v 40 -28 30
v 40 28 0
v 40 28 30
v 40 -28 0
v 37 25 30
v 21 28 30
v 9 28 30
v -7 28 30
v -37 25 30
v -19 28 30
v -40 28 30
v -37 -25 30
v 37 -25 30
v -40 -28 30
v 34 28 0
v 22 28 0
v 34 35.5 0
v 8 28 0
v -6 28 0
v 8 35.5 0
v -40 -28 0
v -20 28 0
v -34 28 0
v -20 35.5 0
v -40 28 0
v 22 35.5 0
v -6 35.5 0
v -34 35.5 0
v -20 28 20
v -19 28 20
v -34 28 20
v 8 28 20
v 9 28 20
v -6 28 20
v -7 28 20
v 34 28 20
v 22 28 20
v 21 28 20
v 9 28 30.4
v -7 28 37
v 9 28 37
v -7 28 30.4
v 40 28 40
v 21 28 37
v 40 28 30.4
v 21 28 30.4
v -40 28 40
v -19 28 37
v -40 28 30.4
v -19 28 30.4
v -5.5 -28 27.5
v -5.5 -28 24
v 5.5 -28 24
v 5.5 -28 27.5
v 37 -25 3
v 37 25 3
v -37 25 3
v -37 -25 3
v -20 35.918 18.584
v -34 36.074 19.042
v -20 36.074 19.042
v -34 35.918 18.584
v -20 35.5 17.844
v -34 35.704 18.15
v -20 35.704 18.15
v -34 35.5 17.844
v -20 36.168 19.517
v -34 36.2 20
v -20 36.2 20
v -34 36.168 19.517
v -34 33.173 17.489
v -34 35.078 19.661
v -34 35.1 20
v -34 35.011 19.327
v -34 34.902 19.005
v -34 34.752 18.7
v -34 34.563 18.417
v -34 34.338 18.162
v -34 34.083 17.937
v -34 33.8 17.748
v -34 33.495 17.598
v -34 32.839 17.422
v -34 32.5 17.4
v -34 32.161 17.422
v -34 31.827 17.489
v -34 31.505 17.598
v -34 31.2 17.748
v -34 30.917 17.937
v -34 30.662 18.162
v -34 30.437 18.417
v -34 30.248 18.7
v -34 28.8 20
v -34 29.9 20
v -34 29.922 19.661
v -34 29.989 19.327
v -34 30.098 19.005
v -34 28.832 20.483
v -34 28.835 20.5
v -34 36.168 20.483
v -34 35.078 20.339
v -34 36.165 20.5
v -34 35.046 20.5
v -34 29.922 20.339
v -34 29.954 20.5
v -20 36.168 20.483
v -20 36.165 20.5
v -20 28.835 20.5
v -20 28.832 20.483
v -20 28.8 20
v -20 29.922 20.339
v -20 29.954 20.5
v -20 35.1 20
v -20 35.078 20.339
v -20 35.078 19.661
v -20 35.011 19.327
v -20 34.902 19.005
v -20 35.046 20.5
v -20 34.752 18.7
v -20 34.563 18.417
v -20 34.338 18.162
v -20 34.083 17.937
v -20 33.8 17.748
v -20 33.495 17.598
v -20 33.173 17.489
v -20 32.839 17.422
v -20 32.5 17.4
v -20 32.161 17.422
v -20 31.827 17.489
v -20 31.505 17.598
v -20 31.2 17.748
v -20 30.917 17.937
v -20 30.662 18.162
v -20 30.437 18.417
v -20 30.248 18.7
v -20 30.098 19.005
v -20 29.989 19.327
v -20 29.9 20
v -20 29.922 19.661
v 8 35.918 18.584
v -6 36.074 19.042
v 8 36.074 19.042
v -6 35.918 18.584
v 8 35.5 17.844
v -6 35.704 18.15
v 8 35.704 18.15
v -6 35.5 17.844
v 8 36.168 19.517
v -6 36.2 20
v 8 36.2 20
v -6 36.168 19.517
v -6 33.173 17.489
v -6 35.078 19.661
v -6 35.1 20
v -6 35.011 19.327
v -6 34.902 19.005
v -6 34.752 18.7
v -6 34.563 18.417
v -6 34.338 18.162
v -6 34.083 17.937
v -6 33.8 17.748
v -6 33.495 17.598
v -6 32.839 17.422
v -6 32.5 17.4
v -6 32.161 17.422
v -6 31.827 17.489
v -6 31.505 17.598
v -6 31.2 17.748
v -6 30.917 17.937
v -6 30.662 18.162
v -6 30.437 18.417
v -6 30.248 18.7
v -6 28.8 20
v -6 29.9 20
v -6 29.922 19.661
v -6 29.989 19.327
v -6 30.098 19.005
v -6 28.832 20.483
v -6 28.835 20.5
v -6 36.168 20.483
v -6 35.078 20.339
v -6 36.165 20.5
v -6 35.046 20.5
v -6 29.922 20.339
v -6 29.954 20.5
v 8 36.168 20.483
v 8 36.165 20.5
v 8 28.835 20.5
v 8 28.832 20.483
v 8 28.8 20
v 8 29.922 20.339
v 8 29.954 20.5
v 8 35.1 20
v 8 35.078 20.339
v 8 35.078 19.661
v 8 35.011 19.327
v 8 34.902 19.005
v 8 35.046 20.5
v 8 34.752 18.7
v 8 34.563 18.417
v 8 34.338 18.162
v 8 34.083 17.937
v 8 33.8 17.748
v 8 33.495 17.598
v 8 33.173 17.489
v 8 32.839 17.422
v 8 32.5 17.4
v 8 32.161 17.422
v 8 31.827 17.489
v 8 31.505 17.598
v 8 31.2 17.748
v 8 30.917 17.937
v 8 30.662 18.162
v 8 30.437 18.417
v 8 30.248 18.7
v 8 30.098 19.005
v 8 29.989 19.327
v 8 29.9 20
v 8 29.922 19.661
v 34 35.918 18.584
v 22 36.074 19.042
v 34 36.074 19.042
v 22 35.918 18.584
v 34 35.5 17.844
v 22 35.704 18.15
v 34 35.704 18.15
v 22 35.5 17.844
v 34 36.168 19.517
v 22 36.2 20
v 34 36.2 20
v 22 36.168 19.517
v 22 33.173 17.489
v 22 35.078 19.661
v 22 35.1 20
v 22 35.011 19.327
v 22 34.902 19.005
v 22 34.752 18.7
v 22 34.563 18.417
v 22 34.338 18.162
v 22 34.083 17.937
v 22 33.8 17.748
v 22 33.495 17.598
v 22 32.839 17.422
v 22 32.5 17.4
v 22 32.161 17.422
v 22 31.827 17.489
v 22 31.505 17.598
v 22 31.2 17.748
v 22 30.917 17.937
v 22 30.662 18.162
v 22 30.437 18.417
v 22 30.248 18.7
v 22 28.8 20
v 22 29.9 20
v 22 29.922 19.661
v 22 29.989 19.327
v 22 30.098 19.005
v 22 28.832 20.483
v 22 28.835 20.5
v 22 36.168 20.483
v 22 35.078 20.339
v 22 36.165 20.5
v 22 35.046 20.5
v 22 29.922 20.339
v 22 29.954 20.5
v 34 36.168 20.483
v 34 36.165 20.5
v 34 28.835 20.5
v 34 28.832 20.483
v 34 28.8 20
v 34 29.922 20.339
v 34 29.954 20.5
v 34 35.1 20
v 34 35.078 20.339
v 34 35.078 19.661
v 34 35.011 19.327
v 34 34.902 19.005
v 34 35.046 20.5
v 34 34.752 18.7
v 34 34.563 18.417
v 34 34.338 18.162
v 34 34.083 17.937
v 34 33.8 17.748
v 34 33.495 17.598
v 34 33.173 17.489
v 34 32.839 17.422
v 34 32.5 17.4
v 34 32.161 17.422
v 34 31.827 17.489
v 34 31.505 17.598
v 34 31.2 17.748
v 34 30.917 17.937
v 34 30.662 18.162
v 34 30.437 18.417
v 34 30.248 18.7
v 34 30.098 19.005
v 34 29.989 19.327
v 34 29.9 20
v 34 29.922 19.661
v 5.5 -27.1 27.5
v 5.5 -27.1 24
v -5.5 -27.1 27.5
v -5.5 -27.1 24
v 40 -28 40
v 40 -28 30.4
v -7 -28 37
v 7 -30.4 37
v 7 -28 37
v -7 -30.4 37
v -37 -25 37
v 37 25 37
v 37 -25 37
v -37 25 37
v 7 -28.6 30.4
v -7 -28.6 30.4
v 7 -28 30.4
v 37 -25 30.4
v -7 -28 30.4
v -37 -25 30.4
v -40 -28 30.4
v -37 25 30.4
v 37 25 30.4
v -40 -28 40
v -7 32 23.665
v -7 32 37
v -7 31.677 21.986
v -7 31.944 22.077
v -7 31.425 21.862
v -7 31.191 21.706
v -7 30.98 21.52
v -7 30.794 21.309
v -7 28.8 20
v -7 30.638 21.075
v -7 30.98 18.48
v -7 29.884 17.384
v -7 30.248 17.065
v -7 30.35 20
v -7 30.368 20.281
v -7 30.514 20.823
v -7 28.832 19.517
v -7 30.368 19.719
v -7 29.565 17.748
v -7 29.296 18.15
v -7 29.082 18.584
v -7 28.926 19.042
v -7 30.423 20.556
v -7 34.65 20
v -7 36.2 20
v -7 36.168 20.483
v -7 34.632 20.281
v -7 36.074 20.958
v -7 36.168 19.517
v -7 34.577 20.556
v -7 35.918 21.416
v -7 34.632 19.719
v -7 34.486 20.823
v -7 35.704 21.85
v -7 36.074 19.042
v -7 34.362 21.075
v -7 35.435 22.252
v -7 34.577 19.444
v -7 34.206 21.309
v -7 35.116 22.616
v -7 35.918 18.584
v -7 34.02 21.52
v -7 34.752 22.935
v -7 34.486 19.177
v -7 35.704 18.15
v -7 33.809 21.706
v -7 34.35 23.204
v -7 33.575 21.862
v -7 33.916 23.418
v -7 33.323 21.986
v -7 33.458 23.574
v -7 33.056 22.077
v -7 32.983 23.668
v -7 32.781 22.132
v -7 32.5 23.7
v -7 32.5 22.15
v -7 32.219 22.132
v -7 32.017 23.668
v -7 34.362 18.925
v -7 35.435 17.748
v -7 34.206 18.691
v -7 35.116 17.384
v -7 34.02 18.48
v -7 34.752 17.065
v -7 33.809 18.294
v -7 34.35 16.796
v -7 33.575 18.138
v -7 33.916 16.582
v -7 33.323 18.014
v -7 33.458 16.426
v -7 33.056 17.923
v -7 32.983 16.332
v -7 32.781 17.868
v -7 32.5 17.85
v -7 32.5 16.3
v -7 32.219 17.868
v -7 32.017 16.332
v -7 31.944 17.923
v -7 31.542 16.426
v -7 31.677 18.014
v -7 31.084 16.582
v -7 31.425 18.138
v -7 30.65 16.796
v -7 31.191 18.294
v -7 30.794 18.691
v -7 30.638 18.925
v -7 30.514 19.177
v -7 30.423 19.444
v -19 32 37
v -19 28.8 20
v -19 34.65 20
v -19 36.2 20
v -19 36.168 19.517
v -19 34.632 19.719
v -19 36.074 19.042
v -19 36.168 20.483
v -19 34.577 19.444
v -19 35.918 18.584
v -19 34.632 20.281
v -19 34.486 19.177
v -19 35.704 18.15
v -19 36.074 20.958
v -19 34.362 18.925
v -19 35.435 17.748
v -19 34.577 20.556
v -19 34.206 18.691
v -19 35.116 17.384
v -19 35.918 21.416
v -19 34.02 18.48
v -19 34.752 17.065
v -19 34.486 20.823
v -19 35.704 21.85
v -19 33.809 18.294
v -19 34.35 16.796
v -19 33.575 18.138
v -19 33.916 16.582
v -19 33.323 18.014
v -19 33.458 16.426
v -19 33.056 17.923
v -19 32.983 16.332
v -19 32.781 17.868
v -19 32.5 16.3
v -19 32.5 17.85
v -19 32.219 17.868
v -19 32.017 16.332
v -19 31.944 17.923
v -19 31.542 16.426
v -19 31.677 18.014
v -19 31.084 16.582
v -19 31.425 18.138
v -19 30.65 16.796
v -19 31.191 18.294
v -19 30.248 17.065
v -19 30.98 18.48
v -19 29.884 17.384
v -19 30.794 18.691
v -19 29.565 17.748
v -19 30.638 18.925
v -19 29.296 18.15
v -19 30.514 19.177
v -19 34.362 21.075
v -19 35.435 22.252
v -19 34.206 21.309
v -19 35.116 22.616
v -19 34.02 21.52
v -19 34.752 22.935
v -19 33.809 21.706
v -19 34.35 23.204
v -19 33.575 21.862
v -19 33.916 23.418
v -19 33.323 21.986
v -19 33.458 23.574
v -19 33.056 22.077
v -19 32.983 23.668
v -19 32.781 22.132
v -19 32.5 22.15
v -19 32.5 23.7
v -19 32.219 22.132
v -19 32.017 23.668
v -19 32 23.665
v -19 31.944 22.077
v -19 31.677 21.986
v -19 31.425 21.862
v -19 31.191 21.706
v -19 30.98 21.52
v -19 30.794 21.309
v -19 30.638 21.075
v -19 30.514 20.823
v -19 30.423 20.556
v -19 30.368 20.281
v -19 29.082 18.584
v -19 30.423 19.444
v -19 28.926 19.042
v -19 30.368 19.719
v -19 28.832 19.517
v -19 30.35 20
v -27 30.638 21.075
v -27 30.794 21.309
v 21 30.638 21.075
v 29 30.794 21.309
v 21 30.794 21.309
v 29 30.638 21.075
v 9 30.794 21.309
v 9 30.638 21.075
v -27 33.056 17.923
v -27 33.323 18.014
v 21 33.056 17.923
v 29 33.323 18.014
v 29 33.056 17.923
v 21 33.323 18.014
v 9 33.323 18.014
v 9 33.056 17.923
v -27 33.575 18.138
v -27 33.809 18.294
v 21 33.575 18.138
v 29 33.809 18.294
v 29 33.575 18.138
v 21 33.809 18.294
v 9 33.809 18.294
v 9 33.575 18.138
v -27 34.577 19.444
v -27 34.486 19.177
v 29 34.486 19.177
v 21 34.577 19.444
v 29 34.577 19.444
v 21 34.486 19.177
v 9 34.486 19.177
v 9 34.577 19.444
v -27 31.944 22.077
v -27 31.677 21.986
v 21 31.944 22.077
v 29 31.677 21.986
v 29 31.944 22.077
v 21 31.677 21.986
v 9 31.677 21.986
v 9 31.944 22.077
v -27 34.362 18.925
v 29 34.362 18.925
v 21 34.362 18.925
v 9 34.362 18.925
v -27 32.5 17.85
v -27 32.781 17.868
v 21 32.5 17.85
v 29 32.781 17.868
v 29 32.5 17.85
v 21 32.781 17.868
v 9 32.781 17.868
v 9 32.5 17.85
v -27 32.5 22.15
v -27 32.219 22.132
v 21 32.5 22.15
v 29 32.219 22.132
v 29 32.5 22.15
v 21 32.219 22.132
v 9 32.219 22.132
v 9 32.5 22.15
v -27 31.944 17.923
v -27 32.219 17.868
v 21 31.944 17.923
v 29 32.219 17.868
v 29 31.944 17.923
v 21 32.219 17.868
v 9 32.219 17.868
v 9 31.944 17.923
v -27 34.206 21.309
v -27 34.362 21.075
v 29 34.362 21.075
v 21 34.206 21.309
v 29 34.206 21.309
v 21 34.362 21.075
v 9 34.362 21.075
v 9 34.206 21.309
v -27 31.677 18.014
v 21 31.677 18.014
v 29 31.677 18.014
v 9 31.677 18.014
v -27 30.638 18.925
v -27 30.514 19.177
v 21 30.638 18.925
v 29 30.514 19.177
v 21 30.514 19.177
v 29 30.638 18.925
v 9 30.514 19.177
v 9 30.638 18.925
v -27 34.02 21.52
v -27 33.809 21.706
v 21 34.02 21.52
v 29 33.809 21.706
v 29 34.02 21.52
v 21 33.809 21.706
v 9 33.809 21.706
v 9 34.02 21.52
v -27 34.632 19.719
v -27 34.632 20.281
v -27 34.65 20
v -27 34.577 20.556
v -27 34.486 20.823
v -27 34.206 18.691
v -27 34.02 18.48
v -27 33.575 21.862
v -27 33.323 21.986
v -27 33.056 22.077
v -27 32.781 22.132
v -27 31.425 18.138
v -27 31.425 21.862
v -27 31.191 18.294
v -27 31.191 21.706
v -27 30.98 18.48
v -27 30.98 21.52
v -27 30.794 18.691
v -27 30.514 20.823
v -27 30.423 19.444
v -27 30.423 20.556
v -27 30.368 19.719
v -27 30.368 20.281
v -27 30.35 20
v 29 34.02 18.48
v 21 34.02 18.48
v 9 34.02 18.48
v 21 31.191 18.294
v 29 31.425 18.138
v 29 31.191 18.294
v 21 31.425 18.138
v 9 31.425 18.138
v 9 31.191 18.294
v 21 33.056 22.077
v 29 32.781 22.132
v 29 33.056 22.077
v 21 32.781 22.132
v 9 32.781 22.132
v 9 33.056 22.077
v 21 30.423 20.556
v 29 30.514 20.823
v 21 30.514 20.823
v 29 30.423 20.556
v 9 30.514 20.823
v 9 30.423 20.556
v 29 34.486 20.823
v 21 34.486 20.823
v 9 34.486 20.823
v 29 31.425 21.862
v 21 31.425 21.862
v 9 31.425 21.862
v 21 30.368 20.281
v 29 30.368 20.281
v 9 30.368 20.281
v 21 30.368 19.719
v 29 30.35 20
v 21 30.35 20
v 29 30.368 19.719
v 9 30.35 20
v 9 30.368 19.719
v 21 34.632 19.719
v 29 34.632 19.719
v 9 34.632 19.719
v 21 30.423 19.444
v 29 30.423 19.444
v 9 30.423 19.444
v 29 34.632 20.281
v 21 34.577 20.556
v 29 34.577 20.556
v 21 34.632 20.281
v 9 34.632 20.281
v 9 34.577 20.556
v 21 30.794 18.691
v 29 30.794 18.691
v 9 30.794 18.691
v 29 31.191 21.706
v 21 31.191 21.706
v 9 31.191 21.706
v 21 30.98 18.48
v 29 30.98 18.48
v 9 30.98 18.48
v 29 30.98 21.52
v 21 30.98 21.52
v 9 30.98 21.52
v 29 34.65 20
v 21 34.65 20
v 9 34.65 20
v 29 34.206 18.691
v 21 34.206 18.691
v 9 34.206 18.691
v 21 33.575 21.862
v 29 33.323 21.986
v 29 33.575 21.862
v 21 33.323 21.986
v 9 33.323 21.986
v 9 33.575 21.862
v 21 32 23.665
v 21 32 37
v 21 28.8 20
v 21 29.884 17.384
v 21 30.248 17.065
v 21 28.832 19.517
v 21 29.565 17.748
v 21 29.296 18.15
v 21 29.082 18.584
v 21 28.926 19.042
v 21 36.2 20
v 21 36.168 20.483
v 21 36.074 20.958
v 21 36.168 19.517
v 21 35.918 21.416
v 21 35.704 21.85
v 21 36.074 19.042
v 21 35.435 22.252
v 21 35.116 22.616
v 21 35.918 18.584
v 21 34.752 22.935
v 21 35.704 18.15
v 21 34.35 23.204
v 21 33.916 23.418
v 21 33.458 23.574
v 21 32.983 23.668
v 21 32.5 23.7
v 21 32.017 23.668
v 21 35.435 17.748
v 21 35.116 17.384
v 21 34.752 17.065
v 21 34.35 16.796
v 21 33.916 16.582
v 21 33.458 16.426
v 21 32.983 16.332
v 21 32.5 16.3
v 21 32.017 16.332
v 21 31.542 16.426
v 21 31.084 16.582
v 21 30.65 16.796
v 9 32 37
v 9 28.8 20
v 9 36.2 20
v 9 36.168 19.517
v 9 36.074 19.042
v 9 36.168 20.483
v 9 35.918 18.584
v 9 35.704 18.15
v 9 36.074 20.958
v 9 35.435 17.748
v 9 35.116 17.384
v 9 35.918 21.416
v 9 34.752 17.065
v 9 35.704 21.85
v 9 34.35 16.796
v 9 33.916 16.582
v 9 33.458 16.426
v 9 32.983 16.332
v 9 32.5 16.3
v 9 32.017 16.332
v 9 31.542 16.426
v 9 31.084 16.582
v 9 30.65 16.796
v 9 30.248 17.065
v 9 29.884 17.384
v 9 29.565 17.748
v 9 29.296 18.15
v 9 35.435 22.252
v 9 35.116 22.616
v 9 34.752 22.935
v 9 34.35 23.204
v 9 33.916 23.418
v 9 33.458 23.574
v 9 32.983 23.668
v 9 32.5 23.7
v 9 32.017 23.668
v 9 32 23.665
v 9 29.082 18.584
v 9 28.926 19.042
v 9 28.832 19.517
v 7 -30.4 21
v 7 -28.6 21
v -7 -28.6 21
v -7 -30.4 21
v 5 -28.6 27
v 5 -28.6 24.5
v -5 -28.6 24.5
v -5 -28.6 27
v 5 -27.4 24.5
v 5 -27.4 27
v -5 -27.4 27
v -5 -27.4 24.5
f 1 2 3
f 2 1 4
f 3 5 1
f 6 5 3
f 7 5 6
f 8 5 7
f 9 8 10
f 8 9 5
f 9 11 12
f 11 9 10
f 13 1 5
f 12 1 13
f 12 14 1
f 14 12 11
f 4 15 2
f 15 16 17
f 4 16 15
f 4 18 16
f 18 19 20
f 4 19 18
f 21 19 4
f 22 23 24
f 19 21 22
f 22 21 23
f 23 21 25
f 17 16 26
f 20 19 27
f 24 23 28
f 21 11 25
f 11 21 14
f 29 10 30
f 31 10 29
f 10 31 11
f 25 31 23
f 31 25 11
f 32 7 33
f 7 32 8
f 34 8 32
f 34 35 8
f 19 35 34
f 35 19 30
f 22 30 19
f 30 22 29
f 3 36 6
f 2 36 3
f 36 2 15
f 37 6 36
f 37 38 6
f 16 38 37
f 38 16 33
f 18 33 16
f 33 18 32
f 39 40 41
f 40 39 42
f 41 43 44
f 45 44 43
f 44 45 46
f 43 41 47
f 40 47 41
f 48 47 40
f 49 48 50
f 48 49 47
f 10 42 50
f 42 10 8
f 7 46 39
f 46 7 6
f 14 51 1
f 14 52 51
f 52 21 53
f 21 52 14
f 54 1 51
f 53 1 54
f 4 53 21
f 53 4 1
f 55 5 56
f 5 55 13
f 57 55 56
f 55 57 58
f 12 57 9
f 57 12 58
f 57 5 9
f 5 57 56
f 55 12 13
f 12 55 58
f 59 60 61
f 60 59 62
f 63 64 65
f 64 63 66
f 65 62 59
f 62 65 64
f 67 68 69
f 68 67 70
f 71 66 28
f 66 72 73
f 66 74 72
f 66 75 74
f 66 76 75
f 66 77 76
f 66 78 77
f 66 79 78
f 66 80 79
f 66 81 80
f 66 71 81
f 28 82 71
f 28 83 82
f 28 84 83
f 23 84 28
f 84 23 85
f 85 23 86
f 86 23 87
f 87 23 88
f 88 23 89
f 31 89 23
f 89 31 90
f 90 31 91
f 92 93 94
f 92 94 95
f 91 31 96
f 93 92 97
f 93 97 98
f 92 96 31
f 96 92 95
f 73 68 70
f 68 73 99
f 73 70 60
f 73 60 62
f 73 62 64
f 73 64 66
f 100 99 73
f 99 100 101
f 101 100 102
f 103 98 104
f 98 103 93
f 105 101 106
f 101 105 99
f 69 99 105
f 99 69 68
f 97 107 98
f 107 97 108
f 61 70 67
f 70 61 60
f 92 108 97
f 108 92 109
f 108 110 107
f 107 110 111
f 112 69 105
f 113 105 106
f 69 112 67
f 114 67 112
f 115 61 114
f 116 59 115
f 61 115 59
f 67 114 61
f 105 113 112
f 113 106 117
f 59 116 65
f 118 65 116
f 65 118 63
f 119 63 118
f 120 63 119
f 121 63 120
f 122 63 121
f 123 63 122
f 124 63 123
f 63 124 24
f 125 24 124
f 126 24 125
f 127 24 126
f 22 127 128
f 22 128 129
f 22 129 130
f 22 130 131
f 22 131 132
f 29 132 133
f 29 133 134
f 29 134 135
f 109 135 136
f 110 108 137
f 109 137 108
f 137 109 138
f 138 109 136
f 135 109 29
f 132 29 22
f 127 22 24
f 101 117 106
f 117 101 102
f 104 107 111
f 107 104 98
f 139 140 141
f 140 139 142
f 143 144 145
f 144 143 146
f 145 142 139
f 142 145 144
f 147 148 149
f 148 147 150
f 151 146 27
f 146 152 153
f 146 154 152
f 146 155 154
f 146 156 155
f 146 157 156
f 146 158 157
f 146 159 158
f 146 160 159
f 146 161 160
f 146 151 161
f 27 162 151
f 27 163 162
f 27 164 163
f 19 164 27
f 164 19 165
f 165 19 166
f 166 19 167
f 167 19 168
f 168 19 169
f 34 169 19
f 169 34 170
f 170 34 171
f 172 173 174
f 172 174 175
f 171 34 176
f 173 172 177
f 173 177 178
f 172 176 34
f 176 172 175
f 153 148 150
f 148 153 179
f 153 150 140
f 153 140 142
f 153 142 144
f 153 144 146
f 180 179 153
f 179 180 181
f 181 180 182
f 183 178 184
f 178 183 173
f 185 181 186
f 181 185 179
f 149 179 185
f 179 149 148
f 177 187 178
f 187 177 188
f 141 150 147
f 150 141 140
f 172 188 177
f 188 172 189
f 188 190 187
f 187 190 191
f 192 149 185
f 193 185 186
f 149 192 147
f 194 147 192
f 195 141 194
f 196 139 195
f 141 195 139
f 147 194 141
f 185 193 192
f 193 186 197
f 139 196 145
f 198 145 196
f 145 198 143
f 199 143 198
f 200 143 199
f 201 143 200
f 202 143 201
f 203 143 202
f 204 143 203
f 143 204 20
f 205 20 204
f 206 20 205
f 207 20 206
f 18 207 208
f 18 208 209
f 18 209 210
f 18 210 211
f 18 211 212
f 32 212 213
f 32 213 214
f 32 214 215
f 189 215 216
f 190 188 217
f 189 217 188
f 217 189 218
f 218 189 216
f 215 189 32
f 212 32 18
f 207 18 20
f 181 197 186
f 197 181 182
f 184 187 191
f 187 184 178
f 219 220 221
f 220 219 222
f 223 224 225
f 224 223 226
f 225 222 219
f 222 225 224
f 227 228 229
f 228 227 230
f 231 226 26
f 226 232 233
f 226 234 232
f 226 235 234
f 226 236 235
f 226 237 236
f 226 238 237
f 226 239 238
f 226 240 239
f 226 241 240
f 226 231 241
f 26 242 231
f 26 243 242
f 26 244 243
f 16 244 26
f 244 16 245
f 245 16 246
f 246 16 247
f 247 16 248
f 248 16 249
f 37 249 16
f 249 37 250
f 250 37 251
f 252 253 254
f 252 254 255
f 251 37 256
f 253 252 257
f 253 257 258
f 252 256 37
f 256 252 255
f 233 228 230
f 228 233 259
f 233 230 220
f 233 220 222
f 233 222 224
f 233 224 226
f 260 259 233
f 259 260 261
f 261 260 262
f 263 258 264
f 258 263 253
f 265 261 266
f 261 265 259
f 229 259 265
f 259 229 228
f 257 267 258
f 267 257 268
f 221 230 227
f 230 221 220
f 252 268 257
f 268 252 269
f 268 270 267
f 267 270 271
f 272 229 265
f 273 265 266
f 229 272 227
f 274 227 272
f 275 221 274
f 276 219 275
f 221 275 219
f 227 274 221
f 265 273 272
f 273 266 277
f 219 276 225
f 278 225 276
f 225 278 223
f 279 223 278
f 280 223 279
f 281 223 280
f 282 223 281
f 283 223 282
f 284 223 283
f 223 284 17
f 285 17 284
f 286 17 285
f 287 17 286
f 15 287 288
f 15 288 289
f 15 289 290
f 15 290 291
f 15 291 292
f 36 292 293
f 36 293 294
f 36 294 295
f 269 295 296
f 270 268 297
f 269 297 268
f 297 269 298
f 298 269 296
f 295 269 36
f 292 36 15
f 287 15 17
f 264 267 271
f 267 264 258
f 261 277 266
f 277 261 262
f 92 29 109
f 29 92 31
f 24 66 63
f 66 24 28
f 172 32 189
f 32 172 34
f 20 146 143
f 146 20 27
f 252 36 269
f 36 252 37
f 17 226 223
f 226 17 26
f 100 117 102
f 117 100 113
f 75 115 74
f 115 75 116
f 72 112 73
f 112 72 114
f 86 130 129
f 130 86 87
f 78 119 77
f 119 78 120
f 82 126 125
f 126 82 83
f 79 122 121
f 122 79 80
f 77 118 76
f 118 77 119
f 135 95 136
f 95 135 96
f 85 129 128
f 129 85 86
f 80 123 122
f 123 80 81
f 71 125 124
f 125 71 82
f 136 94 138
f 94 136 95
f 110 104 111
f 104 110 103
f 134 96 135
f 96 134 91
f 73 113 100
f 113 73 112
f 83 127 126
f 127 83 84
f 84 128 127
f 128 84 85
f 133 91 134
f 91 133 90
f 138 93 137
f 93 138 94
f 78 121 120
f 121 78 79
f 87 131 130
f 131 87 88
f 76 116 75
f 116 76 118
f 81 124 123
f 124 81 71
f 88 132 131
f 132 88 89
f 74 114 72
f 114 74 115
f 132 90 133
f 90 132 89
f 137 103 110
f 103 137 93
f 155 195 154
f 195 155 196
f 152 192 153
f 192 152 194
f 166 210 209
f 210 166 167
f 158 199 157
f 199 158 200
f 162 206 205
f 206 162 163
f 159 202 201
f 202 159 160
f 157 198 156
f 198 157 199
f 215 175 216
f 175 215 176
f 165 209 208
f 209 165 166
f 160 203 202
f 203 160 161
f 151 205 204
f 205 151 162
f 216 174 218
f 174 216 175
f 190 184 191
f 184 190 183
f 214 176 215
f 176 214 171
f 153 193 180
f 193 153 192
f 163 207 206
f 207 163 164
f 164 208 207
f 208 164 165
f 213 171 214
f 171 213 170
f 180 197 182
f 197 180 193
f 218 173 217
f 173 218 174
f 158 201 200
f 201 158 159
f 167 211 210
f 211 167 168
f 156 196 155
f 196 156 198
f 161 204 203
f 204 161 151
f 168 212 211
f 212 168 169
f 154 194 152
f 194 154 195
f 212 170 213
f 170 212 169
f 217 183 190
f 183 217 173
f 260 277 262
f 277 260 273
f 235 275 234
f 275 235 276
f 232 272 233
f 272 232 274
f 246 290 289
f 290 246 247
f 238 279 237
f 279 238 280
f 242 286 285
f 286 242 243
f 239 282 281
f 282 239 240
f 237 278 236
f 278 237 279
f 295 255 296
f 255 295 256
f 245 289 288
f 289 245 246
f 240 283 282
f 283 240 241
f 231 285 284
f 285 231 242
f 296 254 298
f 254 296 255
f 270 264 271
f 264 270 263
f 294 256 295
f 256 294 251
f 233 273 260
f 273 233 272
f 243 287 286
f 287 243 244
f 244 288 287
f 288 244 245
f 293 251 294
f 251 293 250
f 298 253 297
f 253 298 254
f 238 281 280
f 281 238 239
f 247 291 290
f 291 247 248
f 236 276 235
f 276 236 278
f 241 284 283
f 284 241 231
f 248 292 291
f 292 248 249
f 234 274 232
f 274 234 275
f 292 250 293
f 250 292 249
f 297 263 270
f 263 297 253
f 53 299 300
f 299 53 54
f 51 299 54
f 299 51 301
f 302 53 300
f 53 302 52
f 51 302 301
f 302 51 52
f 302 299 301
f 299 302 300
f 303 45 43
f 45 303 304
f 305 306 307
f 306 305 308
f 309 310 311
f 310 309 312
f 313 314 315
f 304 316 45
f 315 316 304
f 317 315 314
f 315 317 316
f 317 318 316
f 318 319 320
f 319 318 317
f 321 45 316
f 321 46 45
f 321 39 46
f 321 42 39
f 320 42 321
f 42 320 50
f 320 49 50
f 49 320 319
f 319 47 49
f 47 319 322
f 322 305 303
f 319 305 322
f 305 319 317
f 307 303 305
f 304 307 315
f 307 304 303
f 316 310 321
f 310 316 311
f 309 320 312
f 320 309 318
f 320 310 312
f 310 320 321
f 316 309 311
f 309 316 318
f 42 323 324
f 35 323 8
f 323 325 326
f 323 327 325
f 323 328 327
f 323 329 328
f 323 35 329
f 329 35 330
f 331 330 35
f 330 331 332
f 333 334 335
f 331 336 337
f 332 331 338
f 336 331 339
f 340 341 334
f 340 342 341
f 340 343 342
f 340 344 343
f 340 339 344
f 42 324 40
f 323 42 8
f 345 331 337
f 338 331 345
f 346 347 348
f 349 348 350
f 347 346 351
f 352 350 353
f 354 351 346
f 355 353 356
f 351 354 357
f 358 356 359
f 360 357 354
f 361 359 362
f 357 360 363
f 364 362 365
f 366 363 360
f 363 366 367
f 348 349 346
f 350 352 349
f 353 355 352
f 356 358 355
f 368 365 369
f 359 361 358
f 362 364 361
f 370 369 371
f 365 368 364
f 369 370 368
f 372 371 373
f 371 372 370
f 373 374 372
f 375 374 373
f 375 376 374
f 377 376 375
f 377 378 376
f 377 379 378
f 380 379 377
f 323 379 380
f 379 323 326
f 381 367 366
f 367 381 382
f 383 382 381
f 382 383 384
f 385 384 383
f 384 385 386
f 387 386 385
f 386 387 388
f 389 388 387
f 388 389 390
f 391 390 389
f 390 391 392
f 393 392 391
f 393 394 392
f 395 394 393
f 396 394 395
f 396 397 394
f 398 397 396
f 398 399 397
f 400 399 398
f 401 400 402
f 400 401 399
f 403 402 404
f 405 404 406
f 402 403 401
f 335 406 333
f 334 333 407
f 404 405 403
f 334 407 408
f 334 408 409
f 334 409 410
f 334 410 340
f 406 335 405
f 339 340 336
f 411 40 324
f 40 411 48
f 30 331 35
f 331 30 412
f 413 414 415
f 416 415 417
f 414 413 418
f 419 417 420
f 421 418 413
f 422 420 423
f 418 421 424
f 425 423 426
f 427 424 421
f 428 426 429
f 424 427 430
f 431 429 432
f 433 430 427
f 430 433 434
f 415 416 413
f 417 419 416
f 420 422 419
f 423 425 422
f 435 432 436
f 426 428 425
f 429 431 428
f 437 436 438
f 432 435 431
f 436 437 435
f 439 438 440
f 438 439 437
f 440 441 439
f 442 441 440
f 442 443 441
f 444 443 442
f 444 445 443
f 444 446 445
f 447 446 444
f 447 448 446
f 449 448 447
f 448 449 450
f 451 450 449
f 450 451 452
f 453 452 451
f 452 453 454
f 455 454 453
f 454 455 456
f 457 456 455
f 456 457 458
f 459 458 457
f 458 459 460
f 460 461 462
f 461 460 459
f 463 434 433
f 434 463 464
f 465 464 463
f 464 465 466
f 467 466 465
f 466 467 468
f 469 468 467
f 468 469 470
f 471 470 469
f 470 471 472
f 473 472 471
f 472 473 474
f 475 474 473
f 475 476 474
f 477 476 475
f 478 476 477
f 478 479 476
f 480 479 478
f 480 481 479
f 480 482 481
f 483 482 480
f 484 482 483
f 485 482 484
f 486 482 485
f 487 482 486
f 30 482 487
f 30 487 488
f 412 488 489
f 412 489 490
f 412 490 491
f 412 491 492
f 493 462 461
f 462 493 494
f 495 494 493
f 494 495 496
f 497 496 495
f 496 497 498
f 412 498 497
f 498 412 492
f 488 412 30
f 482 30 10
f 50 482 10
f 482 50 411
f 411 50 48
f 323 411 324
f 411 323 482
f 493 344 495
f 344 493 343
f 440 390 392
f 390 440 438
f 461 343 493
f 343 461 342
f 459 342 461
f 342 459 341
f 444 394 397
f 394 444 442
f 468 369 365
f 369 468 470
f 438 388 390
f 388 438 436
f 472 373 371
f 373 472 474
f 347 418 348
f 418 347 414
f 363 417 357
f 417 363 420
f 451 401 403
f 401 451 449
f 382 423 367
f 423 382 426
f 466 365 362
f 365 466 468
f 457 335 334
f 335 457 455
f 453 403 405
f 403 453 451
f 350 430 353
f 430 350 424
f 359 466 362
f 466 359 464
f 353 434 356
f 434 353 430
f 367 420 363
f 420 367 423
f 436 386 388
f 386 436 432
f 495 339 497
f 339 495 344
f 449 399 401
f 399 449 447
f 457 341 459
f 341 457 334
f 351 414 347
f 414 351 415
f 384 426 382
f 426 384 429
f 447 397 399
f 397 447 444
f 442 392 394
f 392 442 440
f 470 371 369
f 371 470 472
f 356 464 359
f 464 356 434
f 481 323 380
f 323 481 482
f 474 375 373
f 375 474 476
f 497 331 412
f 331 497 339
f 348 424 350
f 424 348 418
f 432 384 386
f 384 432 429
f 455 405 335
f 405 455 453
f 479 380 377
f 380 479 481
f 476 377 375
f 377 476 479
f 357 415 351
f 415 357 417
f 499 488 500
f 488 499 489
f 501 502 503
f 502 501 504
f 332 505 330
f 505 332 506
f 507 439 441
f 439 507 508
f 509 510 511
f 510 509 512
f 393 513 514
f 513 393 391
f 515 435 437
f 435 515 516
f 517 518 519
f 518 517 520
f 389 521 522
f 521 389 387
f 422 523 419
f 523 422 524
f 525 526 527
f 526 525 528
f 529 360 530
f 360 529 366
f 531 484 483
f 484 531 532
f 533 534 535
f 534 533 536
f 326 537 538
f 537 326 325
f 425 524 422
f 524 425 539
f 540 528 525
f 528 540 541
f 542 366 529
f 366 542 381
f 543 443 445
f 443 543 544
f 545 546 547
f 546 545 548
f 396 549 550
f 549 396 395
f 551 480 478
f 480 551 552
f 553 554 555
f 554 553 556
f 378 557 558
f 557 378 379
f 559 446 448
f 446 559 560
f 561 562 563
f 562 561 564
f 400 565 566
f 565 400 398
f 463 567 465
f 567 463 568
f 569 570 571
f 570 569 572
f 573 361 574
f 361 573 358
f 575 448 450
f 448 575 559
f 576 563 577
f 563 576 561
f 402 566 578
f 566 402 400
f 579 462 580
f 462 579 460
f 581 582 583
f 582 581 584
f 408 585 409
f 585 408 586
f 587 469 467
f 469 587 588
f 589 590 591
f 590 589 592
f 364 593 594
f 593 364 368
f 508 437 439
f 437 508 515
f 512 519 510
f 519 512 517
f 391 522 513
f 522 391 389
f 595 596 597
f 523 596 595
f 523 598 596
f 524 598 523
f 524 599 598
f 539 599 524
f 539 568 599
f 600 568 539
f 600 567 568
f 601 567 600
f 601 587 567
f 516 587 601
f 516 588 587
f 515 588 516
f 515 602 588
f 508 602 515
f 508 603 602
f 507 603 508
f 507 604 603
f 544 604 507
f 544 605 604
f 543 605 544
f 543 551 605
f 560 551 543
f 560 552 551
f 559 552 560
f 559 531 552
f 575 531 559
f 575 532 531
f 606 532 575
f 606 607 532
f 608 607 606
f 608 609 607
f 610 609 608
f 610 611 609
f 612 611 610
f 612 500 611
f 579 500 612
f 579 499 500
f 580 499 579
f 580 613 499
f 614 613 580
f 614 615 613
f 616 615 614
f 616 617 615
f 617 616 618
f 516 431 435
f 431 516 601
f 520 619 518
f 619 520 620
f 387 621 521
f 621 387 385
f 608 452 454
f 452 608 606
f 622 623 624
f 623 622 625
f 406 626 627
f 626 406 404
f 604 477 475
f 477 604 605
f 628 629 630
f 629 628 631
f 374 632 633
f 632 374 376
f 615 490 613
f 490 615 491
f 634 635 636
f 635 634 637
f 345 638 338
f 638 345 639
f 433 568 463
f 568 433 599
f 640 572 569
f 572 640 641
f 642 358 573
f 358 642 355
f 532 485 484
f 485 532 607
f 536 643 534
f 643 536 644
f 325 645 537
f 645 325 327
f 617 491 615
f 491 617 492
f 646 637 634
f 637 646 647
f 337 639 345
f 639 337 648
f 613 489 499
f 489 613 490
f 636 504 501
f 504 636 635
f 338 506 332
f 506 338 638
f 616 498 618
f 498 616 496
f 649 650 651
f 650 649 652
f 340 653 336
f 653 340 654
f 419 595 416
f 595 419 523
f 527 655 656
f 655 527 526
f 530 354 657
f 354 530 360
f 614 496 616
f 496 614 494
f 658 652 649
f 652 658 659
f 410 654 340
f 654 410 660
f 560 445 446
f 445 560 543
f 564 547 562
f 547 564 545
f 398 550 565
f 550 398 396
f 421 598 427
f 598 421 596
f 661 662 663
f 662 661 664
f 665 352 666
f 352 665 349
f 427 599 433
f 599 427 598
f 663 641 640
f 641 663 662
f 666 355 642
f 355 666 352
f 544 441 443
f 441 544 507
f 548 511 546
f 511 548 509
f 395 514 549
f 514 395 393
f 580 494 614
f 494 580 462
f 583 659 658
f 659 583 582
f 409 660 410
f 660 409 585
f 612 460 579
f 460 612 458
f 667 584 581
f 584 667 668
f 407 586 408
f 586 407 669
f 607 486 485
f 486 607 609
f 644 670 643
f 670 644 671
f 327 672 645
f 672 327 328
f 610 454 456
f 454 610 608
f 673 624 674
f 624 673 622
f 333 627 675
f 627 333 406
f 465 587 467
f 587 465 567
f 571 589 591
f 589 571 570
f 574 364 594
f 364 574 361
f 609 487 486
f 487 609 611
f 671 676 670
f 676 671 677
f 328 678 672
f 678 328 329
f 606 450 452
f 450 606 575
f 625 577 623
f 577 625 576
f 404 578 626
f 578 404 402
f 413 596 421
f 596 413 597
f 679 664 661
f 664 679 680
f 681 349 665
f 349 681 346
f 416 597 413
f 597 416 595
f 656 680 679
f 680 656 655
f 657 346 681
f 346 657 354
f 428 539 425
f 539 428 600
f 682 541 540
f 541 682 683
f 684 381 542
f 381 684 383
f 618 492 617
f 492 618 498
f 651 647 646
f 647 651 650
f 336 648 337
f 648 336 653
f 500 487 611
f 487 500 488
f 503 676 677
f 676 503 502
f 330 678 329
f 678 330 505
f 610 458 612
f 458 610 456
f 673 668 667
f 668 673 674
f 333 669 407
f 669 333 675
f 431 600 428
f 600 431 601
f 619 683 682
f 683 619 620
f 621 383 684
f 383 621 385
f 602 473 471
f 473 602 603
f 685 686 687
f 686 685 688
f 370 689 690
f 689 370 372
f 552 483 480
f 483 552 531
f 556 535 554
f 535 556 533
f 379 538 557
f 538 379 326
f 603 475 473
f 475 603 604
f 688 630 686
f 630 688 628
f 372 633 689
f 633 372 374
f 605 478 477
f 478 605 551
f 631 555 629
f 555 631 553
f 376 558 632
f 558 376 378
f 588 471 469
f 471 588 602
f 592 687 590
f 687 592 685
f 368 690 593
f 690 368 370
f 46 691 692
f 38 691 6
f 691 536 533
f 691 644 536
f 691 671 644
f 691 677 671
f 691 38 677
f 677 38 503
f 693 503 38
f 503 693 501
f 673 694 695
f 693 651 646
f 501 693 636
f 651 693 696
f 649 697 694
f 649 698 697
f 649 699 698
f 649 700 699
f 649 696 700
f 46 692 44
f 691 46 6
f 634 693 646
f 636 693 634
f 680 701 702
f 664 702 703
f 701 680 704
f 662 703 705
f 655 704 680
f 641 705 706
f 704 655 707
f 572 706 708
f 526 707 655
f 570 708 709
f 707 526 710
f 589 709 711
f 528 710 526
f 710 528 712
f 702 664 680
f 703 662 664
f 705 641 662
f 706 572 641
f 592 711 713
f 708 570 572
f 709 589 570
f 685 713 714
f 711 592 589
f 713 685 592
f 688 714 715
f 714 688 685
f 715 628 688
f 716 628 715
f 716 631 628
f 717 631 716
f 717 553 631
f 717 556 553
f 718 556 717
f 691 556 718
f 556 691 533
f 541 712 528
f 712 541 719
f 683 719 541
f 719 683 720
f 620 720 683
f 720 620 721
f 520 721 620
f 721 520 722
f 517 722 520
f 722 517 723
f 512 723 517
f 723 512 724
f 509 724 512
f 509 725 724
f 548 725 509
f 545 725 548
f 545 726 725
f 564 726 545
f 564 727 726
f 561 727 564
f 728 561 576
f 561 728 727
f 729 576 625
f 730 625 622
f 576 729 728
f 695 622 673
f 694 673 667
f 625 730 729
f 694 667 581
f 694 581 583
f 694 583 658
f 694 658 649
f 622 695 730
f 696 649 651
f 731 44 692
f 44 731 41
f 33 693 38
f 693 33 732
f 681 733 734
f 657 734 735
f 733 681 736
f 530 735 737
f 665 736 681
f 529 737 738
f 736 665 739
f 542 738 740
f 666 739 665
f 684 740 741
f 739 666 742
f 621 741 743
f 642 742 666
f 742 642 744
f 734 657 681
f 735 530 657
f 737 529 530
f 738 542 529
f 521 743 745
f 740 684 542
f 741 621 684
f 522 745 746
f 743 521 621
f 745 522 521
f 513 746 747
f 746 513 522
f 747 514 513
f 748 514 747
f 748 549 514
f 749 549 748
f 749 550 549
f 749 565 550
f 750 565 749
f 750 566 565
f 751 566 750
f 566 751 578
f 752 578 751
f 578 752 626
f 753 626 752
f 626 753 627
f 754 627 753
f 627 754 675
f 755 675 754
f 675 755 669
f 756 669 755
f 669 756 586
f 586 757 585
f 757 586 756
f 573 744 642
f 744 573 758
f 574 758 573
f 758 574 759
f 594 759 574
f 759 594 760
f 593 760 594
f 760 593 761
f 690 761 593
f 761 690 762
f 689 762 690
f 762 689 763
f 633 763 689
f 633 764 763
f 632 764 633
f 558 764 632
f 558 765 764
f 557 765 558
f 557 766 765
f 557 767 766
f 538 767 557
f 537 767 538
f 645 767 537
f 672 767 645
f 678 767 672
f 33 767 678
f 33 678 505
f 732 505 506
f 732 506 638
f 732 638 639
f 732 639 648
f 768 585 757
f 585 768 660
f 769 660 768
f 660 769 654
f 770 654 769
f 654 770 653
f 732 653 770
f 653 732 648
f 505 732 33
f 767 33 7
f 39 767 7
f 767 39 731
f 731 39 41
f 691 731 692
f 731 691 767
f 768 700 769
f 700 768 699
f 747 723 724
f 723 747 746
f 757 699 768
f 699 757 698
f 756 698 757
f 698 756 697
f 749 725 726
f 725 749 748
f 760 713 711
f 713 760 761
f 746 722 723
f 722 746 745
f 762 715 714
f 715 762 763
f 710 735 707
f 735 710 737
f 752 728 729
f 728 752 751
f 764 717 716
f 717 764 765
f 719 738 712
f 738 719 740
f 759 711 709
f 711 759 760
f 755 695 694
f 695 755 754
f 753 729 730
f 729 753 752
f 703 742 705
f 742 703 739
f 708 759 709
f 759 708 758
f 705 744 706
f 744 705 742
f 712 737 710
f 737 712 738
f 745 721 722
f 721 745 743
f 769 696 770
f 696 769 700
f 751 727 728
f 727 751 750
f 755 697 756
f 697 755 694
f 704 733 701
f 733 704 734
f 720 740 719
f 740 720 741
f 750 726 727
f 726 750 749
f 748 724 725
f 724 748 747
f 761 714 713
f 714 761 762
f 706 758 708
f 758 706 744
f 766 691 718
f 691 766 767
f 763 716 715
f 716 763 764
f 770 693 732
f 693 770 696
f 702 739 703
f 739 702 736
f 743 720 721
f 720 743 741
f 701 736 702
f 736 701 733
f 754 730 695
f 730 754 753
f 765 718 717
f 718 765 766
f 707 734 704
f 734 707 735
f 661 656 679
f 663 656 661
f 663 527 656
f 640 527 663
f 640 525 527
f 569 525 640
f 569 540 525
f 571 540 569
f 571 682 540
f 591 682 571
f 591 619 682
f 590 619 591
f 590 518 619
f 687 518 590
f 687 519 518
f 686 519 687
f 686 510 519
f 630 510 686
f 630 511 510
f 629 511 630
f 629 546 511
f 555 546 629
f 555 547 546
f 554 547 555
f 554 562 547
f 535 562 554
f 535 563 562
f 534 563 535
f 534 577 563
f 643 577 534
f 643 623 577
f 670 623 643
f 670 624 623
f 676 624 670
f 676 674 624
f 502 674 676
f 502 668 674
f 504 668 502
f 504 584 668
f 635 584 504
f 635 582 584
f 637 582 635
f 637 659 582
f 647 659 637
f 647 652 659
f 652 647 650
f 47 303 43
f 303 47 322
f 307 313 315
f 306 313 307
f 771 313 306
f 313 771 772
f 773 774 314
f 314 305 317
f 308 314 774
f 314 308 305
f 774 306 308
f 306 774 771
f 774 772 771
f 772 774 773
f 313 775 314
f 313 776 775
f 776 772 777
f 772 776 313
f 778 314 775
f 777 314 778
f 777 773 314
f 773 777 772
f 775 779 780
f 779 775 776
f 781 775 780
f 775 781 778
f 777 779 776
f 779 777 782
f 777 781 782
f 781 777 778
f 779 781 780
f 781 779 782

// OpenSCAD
// Print-in-place hinged box, 80 x ~65 x 40 mm closed (80 x 56 body + hinge/catch)
// Parts: base, lid, pin.  Assembly = closed box.  Print pose = lid open 180 deg,
// lying flat behind the base, both trays opening up, pin captive in the knuckles.
part = "assembly"; // [assembly, base, lid]
cadverify_only = "";
module instance(name, p, unit = 1) {
    echo(cadverify_instance = [name, p, unit]);
    if (cadverify_only == "" || cadverify_only == name) children();
}
$fn = 48;
// ---- dimensions (assembly / closed coordinates) ----
W = 80; D = 56; base_h = 30; lid_top = 40; wall = 3;
ax_y = 32.5; ax_z = 20;            // hinge axis, 0.8 mm behind rear wall (y=28)
r_out = 3.7; r_bore = 2.6; r_stub = 2.15; // lid pin stubs, 0.45 radial clearance in base bores
base_segs = [[-34, -20], [-6, 8], [22, 34]];
lid_segs  = [[-19, -7], [9, 21]];
module cylx(x0, len, r) translate([x0, 0, 0]) rotate([0, 90, 0]) cylinder(h = len, r = r);
module base_closed() {
    difference() {
        union() {
            difference() {
                translate([-40, -28, 0]) cube([80, 56, 30]);
                translate([-37, -25, 3]) cube([74, 50, 30]);
            }
            for (s = base_segs) {
                translate([s[0], 27, 0]) cube([s[1] - s[0], 8.5, 20]); // pillar to bed, supports knuckle
                intersection() { // open-top cradle (lower knuckle): lid stub drops in, no enclosed bore
                    translate([0, ax_y, ax_z]) cylx(s[0], s[1] - s[0], r_out);
                    translate([s[0], ax_y - 4, ax_z - 4]) cube([s[1] - s[0], 8, 4.5]);
                }
            }
        }
        for (s = base_segs) translate([0, ax_y, ax_z]) cylx(s[0] - 1, s[1] - s[0] + 2, r_bore);
        translate([-5.5, -29, 24]) cube([11, 1.9, 3.5]); // catch pocket, front wall
    }
}
module lid_closed() {
    union() {
            translate([-40, -28, 37]) cube([80, 56, 3]);               // top panel
            difference() {                                              // skirt
                translate([-40, -28, 30.4]) cube([80, 56, 6.6]);
                translate([-37, -25, 29]) cube([74, 50, 8]);
            }
            for (s = lid_segs) {
                translate([s[0], 28, 20]) cube([s[1] - s[0], 4, 17]);  // hinge strap
                translate([0, ax_y, ax_z]) cylx(s[0], s[1] - s[0], r_out);
                translate([0, ax_y, ax_z]) cylx(s[0] - 8, s[1] - s[0] + 16, r_stub); // integral pin stubs into base bores
            }
            translate([-7, -30.4, 30.4]) cube([14, 2.4, 6.6]);          // catch spacer
            translate([-7, -30.4, 21]) cube([14, 1.8, 12]);             // catch tab
            translate([-5, -28.6, 24.5]) cube([10, 1.2, 2.5]);          // catch bump
    }
}
module lid_print() translate([0, -28.8, 0]) translate([0, ax_y, ax_z])
    rotate([180, 0, 0]) translate([0, -ax_y, -ax_z]) lid_closed();
// ---- specs (exported-part coordinates) ----
if (part == "base") echo(cadverify_spec = [
    ["bounds", [[-40, -28, 0], [40, 36.2, 30]]], ["bodies", 1], ["through_holes", 0],
    ["support_faces", [["bed", "-z", 4000]]],
    ["overhangs_allowed", [["hinge cradle groove, pillars rise to the knuckles from the bed", [[-40, 26, 14], [40, 37, 24]]],
                            ["catch pocket ceiling", [[-8, -29, 23], [8, -26, 29]]]]],
    ["copies", 1],
    ["details", [
        ["floor", "material", [[-37, -25, 0], [37, 25, 3]], 0.95],
        ["cavity", "void", [[-36, -24, 10], [36, 24, 29]], 0.98],
        ["base_knuckle", "material", [[-30, 34.8, 19], [-24, 35.8, 20]], 0.7],
        ["cradle_groove", "void", [[-30, 31.8, 19.3], [-24, 33.2, 20.7]], 0.95],
        ["front_wall", "thickness", [0, -35, 15], [0, 1, 0], 3]
    ]]]);
if (part == "lid") echo(cadverify_spec = [
    ["bounds", [[-40, 0, 0], [40, 66.6, 23.7]]], ["bodies", 1], ["through_holes", 0],
    ["support_faces", [["bed", "-z", 4000]]],
    ["overhangs_allowed", [["strap and hinge knuckle undersides, within 5 mm of the panel edge and straps", [[-40, 0, 2], [40, 10, 24]]],
                            ["catch tab and bump undersides", [[-8, 62, 6], [8, 67, 20]]]]],
    ["copies", 1],
    ["details", [
        ["panel", "material", [[-37, 10, 0], [37, 60, 3]], 0.95],
        ["tray_cavity", "void", [[-35, 14, 3.5], [35, 57, 9]], 0.95],
        ["strap", "material", [[10, 5, 10], [20, 7.5, 18]], 0.85],
        ["panel_thickness", "thickness", [0, 35, -5], [0, 0, 1], 3],
        ["catch_tab", "view", [[-8, 64, 6], [8, 67, 20]]]
    ]]]);
if (part == "assembly") echo(cadverify_spec = [
    ["bounds", [[-40, -30.4, 0], [40, 36.2, 40]]],
    ["support_faces", [["bed", "-z", 4000]]],
    ["allowed_interferences", []],
    ["motions", [["lid_open", ["lid"], "rotate", [0, 32.5, 20], [-1, 0, 0], [0, 180],
        ["flex", [["lid", "base", 1.0, "catch bump snaps out of its pocket and tab flexes"]]]]]],
    ["assembly_order", [
        [["base"], [0, 0, 0]],
        [["lid"], [0, 0, -1]]
    ]],
    ["print_in_place", 0.4],
    ["print_pose", [["lid_open", 180]]],
    ["overhangs_allowed", [["hinge cradles, knuckles, straps and pin stubs, supported by pillars, panel edge and straps within 5 mm", [[-40, 27, 2], [40, 38, 26]]],
                            ["catch tab, spacer and bump in print pose", [[-8, 88, 2], [8, 96, 20]]],
                            ["catch pocket ceiling", [[-8, -31, 20], [8, -26, 29]]]]]
]);
// ---- output ----
if (part == "base") base_closed();
else if (part == "lid") lid_print();
else if (part == "assembly") {
    instance("base", "base") base_closed();
    instance("lid", "lid") lid_closed();
}
